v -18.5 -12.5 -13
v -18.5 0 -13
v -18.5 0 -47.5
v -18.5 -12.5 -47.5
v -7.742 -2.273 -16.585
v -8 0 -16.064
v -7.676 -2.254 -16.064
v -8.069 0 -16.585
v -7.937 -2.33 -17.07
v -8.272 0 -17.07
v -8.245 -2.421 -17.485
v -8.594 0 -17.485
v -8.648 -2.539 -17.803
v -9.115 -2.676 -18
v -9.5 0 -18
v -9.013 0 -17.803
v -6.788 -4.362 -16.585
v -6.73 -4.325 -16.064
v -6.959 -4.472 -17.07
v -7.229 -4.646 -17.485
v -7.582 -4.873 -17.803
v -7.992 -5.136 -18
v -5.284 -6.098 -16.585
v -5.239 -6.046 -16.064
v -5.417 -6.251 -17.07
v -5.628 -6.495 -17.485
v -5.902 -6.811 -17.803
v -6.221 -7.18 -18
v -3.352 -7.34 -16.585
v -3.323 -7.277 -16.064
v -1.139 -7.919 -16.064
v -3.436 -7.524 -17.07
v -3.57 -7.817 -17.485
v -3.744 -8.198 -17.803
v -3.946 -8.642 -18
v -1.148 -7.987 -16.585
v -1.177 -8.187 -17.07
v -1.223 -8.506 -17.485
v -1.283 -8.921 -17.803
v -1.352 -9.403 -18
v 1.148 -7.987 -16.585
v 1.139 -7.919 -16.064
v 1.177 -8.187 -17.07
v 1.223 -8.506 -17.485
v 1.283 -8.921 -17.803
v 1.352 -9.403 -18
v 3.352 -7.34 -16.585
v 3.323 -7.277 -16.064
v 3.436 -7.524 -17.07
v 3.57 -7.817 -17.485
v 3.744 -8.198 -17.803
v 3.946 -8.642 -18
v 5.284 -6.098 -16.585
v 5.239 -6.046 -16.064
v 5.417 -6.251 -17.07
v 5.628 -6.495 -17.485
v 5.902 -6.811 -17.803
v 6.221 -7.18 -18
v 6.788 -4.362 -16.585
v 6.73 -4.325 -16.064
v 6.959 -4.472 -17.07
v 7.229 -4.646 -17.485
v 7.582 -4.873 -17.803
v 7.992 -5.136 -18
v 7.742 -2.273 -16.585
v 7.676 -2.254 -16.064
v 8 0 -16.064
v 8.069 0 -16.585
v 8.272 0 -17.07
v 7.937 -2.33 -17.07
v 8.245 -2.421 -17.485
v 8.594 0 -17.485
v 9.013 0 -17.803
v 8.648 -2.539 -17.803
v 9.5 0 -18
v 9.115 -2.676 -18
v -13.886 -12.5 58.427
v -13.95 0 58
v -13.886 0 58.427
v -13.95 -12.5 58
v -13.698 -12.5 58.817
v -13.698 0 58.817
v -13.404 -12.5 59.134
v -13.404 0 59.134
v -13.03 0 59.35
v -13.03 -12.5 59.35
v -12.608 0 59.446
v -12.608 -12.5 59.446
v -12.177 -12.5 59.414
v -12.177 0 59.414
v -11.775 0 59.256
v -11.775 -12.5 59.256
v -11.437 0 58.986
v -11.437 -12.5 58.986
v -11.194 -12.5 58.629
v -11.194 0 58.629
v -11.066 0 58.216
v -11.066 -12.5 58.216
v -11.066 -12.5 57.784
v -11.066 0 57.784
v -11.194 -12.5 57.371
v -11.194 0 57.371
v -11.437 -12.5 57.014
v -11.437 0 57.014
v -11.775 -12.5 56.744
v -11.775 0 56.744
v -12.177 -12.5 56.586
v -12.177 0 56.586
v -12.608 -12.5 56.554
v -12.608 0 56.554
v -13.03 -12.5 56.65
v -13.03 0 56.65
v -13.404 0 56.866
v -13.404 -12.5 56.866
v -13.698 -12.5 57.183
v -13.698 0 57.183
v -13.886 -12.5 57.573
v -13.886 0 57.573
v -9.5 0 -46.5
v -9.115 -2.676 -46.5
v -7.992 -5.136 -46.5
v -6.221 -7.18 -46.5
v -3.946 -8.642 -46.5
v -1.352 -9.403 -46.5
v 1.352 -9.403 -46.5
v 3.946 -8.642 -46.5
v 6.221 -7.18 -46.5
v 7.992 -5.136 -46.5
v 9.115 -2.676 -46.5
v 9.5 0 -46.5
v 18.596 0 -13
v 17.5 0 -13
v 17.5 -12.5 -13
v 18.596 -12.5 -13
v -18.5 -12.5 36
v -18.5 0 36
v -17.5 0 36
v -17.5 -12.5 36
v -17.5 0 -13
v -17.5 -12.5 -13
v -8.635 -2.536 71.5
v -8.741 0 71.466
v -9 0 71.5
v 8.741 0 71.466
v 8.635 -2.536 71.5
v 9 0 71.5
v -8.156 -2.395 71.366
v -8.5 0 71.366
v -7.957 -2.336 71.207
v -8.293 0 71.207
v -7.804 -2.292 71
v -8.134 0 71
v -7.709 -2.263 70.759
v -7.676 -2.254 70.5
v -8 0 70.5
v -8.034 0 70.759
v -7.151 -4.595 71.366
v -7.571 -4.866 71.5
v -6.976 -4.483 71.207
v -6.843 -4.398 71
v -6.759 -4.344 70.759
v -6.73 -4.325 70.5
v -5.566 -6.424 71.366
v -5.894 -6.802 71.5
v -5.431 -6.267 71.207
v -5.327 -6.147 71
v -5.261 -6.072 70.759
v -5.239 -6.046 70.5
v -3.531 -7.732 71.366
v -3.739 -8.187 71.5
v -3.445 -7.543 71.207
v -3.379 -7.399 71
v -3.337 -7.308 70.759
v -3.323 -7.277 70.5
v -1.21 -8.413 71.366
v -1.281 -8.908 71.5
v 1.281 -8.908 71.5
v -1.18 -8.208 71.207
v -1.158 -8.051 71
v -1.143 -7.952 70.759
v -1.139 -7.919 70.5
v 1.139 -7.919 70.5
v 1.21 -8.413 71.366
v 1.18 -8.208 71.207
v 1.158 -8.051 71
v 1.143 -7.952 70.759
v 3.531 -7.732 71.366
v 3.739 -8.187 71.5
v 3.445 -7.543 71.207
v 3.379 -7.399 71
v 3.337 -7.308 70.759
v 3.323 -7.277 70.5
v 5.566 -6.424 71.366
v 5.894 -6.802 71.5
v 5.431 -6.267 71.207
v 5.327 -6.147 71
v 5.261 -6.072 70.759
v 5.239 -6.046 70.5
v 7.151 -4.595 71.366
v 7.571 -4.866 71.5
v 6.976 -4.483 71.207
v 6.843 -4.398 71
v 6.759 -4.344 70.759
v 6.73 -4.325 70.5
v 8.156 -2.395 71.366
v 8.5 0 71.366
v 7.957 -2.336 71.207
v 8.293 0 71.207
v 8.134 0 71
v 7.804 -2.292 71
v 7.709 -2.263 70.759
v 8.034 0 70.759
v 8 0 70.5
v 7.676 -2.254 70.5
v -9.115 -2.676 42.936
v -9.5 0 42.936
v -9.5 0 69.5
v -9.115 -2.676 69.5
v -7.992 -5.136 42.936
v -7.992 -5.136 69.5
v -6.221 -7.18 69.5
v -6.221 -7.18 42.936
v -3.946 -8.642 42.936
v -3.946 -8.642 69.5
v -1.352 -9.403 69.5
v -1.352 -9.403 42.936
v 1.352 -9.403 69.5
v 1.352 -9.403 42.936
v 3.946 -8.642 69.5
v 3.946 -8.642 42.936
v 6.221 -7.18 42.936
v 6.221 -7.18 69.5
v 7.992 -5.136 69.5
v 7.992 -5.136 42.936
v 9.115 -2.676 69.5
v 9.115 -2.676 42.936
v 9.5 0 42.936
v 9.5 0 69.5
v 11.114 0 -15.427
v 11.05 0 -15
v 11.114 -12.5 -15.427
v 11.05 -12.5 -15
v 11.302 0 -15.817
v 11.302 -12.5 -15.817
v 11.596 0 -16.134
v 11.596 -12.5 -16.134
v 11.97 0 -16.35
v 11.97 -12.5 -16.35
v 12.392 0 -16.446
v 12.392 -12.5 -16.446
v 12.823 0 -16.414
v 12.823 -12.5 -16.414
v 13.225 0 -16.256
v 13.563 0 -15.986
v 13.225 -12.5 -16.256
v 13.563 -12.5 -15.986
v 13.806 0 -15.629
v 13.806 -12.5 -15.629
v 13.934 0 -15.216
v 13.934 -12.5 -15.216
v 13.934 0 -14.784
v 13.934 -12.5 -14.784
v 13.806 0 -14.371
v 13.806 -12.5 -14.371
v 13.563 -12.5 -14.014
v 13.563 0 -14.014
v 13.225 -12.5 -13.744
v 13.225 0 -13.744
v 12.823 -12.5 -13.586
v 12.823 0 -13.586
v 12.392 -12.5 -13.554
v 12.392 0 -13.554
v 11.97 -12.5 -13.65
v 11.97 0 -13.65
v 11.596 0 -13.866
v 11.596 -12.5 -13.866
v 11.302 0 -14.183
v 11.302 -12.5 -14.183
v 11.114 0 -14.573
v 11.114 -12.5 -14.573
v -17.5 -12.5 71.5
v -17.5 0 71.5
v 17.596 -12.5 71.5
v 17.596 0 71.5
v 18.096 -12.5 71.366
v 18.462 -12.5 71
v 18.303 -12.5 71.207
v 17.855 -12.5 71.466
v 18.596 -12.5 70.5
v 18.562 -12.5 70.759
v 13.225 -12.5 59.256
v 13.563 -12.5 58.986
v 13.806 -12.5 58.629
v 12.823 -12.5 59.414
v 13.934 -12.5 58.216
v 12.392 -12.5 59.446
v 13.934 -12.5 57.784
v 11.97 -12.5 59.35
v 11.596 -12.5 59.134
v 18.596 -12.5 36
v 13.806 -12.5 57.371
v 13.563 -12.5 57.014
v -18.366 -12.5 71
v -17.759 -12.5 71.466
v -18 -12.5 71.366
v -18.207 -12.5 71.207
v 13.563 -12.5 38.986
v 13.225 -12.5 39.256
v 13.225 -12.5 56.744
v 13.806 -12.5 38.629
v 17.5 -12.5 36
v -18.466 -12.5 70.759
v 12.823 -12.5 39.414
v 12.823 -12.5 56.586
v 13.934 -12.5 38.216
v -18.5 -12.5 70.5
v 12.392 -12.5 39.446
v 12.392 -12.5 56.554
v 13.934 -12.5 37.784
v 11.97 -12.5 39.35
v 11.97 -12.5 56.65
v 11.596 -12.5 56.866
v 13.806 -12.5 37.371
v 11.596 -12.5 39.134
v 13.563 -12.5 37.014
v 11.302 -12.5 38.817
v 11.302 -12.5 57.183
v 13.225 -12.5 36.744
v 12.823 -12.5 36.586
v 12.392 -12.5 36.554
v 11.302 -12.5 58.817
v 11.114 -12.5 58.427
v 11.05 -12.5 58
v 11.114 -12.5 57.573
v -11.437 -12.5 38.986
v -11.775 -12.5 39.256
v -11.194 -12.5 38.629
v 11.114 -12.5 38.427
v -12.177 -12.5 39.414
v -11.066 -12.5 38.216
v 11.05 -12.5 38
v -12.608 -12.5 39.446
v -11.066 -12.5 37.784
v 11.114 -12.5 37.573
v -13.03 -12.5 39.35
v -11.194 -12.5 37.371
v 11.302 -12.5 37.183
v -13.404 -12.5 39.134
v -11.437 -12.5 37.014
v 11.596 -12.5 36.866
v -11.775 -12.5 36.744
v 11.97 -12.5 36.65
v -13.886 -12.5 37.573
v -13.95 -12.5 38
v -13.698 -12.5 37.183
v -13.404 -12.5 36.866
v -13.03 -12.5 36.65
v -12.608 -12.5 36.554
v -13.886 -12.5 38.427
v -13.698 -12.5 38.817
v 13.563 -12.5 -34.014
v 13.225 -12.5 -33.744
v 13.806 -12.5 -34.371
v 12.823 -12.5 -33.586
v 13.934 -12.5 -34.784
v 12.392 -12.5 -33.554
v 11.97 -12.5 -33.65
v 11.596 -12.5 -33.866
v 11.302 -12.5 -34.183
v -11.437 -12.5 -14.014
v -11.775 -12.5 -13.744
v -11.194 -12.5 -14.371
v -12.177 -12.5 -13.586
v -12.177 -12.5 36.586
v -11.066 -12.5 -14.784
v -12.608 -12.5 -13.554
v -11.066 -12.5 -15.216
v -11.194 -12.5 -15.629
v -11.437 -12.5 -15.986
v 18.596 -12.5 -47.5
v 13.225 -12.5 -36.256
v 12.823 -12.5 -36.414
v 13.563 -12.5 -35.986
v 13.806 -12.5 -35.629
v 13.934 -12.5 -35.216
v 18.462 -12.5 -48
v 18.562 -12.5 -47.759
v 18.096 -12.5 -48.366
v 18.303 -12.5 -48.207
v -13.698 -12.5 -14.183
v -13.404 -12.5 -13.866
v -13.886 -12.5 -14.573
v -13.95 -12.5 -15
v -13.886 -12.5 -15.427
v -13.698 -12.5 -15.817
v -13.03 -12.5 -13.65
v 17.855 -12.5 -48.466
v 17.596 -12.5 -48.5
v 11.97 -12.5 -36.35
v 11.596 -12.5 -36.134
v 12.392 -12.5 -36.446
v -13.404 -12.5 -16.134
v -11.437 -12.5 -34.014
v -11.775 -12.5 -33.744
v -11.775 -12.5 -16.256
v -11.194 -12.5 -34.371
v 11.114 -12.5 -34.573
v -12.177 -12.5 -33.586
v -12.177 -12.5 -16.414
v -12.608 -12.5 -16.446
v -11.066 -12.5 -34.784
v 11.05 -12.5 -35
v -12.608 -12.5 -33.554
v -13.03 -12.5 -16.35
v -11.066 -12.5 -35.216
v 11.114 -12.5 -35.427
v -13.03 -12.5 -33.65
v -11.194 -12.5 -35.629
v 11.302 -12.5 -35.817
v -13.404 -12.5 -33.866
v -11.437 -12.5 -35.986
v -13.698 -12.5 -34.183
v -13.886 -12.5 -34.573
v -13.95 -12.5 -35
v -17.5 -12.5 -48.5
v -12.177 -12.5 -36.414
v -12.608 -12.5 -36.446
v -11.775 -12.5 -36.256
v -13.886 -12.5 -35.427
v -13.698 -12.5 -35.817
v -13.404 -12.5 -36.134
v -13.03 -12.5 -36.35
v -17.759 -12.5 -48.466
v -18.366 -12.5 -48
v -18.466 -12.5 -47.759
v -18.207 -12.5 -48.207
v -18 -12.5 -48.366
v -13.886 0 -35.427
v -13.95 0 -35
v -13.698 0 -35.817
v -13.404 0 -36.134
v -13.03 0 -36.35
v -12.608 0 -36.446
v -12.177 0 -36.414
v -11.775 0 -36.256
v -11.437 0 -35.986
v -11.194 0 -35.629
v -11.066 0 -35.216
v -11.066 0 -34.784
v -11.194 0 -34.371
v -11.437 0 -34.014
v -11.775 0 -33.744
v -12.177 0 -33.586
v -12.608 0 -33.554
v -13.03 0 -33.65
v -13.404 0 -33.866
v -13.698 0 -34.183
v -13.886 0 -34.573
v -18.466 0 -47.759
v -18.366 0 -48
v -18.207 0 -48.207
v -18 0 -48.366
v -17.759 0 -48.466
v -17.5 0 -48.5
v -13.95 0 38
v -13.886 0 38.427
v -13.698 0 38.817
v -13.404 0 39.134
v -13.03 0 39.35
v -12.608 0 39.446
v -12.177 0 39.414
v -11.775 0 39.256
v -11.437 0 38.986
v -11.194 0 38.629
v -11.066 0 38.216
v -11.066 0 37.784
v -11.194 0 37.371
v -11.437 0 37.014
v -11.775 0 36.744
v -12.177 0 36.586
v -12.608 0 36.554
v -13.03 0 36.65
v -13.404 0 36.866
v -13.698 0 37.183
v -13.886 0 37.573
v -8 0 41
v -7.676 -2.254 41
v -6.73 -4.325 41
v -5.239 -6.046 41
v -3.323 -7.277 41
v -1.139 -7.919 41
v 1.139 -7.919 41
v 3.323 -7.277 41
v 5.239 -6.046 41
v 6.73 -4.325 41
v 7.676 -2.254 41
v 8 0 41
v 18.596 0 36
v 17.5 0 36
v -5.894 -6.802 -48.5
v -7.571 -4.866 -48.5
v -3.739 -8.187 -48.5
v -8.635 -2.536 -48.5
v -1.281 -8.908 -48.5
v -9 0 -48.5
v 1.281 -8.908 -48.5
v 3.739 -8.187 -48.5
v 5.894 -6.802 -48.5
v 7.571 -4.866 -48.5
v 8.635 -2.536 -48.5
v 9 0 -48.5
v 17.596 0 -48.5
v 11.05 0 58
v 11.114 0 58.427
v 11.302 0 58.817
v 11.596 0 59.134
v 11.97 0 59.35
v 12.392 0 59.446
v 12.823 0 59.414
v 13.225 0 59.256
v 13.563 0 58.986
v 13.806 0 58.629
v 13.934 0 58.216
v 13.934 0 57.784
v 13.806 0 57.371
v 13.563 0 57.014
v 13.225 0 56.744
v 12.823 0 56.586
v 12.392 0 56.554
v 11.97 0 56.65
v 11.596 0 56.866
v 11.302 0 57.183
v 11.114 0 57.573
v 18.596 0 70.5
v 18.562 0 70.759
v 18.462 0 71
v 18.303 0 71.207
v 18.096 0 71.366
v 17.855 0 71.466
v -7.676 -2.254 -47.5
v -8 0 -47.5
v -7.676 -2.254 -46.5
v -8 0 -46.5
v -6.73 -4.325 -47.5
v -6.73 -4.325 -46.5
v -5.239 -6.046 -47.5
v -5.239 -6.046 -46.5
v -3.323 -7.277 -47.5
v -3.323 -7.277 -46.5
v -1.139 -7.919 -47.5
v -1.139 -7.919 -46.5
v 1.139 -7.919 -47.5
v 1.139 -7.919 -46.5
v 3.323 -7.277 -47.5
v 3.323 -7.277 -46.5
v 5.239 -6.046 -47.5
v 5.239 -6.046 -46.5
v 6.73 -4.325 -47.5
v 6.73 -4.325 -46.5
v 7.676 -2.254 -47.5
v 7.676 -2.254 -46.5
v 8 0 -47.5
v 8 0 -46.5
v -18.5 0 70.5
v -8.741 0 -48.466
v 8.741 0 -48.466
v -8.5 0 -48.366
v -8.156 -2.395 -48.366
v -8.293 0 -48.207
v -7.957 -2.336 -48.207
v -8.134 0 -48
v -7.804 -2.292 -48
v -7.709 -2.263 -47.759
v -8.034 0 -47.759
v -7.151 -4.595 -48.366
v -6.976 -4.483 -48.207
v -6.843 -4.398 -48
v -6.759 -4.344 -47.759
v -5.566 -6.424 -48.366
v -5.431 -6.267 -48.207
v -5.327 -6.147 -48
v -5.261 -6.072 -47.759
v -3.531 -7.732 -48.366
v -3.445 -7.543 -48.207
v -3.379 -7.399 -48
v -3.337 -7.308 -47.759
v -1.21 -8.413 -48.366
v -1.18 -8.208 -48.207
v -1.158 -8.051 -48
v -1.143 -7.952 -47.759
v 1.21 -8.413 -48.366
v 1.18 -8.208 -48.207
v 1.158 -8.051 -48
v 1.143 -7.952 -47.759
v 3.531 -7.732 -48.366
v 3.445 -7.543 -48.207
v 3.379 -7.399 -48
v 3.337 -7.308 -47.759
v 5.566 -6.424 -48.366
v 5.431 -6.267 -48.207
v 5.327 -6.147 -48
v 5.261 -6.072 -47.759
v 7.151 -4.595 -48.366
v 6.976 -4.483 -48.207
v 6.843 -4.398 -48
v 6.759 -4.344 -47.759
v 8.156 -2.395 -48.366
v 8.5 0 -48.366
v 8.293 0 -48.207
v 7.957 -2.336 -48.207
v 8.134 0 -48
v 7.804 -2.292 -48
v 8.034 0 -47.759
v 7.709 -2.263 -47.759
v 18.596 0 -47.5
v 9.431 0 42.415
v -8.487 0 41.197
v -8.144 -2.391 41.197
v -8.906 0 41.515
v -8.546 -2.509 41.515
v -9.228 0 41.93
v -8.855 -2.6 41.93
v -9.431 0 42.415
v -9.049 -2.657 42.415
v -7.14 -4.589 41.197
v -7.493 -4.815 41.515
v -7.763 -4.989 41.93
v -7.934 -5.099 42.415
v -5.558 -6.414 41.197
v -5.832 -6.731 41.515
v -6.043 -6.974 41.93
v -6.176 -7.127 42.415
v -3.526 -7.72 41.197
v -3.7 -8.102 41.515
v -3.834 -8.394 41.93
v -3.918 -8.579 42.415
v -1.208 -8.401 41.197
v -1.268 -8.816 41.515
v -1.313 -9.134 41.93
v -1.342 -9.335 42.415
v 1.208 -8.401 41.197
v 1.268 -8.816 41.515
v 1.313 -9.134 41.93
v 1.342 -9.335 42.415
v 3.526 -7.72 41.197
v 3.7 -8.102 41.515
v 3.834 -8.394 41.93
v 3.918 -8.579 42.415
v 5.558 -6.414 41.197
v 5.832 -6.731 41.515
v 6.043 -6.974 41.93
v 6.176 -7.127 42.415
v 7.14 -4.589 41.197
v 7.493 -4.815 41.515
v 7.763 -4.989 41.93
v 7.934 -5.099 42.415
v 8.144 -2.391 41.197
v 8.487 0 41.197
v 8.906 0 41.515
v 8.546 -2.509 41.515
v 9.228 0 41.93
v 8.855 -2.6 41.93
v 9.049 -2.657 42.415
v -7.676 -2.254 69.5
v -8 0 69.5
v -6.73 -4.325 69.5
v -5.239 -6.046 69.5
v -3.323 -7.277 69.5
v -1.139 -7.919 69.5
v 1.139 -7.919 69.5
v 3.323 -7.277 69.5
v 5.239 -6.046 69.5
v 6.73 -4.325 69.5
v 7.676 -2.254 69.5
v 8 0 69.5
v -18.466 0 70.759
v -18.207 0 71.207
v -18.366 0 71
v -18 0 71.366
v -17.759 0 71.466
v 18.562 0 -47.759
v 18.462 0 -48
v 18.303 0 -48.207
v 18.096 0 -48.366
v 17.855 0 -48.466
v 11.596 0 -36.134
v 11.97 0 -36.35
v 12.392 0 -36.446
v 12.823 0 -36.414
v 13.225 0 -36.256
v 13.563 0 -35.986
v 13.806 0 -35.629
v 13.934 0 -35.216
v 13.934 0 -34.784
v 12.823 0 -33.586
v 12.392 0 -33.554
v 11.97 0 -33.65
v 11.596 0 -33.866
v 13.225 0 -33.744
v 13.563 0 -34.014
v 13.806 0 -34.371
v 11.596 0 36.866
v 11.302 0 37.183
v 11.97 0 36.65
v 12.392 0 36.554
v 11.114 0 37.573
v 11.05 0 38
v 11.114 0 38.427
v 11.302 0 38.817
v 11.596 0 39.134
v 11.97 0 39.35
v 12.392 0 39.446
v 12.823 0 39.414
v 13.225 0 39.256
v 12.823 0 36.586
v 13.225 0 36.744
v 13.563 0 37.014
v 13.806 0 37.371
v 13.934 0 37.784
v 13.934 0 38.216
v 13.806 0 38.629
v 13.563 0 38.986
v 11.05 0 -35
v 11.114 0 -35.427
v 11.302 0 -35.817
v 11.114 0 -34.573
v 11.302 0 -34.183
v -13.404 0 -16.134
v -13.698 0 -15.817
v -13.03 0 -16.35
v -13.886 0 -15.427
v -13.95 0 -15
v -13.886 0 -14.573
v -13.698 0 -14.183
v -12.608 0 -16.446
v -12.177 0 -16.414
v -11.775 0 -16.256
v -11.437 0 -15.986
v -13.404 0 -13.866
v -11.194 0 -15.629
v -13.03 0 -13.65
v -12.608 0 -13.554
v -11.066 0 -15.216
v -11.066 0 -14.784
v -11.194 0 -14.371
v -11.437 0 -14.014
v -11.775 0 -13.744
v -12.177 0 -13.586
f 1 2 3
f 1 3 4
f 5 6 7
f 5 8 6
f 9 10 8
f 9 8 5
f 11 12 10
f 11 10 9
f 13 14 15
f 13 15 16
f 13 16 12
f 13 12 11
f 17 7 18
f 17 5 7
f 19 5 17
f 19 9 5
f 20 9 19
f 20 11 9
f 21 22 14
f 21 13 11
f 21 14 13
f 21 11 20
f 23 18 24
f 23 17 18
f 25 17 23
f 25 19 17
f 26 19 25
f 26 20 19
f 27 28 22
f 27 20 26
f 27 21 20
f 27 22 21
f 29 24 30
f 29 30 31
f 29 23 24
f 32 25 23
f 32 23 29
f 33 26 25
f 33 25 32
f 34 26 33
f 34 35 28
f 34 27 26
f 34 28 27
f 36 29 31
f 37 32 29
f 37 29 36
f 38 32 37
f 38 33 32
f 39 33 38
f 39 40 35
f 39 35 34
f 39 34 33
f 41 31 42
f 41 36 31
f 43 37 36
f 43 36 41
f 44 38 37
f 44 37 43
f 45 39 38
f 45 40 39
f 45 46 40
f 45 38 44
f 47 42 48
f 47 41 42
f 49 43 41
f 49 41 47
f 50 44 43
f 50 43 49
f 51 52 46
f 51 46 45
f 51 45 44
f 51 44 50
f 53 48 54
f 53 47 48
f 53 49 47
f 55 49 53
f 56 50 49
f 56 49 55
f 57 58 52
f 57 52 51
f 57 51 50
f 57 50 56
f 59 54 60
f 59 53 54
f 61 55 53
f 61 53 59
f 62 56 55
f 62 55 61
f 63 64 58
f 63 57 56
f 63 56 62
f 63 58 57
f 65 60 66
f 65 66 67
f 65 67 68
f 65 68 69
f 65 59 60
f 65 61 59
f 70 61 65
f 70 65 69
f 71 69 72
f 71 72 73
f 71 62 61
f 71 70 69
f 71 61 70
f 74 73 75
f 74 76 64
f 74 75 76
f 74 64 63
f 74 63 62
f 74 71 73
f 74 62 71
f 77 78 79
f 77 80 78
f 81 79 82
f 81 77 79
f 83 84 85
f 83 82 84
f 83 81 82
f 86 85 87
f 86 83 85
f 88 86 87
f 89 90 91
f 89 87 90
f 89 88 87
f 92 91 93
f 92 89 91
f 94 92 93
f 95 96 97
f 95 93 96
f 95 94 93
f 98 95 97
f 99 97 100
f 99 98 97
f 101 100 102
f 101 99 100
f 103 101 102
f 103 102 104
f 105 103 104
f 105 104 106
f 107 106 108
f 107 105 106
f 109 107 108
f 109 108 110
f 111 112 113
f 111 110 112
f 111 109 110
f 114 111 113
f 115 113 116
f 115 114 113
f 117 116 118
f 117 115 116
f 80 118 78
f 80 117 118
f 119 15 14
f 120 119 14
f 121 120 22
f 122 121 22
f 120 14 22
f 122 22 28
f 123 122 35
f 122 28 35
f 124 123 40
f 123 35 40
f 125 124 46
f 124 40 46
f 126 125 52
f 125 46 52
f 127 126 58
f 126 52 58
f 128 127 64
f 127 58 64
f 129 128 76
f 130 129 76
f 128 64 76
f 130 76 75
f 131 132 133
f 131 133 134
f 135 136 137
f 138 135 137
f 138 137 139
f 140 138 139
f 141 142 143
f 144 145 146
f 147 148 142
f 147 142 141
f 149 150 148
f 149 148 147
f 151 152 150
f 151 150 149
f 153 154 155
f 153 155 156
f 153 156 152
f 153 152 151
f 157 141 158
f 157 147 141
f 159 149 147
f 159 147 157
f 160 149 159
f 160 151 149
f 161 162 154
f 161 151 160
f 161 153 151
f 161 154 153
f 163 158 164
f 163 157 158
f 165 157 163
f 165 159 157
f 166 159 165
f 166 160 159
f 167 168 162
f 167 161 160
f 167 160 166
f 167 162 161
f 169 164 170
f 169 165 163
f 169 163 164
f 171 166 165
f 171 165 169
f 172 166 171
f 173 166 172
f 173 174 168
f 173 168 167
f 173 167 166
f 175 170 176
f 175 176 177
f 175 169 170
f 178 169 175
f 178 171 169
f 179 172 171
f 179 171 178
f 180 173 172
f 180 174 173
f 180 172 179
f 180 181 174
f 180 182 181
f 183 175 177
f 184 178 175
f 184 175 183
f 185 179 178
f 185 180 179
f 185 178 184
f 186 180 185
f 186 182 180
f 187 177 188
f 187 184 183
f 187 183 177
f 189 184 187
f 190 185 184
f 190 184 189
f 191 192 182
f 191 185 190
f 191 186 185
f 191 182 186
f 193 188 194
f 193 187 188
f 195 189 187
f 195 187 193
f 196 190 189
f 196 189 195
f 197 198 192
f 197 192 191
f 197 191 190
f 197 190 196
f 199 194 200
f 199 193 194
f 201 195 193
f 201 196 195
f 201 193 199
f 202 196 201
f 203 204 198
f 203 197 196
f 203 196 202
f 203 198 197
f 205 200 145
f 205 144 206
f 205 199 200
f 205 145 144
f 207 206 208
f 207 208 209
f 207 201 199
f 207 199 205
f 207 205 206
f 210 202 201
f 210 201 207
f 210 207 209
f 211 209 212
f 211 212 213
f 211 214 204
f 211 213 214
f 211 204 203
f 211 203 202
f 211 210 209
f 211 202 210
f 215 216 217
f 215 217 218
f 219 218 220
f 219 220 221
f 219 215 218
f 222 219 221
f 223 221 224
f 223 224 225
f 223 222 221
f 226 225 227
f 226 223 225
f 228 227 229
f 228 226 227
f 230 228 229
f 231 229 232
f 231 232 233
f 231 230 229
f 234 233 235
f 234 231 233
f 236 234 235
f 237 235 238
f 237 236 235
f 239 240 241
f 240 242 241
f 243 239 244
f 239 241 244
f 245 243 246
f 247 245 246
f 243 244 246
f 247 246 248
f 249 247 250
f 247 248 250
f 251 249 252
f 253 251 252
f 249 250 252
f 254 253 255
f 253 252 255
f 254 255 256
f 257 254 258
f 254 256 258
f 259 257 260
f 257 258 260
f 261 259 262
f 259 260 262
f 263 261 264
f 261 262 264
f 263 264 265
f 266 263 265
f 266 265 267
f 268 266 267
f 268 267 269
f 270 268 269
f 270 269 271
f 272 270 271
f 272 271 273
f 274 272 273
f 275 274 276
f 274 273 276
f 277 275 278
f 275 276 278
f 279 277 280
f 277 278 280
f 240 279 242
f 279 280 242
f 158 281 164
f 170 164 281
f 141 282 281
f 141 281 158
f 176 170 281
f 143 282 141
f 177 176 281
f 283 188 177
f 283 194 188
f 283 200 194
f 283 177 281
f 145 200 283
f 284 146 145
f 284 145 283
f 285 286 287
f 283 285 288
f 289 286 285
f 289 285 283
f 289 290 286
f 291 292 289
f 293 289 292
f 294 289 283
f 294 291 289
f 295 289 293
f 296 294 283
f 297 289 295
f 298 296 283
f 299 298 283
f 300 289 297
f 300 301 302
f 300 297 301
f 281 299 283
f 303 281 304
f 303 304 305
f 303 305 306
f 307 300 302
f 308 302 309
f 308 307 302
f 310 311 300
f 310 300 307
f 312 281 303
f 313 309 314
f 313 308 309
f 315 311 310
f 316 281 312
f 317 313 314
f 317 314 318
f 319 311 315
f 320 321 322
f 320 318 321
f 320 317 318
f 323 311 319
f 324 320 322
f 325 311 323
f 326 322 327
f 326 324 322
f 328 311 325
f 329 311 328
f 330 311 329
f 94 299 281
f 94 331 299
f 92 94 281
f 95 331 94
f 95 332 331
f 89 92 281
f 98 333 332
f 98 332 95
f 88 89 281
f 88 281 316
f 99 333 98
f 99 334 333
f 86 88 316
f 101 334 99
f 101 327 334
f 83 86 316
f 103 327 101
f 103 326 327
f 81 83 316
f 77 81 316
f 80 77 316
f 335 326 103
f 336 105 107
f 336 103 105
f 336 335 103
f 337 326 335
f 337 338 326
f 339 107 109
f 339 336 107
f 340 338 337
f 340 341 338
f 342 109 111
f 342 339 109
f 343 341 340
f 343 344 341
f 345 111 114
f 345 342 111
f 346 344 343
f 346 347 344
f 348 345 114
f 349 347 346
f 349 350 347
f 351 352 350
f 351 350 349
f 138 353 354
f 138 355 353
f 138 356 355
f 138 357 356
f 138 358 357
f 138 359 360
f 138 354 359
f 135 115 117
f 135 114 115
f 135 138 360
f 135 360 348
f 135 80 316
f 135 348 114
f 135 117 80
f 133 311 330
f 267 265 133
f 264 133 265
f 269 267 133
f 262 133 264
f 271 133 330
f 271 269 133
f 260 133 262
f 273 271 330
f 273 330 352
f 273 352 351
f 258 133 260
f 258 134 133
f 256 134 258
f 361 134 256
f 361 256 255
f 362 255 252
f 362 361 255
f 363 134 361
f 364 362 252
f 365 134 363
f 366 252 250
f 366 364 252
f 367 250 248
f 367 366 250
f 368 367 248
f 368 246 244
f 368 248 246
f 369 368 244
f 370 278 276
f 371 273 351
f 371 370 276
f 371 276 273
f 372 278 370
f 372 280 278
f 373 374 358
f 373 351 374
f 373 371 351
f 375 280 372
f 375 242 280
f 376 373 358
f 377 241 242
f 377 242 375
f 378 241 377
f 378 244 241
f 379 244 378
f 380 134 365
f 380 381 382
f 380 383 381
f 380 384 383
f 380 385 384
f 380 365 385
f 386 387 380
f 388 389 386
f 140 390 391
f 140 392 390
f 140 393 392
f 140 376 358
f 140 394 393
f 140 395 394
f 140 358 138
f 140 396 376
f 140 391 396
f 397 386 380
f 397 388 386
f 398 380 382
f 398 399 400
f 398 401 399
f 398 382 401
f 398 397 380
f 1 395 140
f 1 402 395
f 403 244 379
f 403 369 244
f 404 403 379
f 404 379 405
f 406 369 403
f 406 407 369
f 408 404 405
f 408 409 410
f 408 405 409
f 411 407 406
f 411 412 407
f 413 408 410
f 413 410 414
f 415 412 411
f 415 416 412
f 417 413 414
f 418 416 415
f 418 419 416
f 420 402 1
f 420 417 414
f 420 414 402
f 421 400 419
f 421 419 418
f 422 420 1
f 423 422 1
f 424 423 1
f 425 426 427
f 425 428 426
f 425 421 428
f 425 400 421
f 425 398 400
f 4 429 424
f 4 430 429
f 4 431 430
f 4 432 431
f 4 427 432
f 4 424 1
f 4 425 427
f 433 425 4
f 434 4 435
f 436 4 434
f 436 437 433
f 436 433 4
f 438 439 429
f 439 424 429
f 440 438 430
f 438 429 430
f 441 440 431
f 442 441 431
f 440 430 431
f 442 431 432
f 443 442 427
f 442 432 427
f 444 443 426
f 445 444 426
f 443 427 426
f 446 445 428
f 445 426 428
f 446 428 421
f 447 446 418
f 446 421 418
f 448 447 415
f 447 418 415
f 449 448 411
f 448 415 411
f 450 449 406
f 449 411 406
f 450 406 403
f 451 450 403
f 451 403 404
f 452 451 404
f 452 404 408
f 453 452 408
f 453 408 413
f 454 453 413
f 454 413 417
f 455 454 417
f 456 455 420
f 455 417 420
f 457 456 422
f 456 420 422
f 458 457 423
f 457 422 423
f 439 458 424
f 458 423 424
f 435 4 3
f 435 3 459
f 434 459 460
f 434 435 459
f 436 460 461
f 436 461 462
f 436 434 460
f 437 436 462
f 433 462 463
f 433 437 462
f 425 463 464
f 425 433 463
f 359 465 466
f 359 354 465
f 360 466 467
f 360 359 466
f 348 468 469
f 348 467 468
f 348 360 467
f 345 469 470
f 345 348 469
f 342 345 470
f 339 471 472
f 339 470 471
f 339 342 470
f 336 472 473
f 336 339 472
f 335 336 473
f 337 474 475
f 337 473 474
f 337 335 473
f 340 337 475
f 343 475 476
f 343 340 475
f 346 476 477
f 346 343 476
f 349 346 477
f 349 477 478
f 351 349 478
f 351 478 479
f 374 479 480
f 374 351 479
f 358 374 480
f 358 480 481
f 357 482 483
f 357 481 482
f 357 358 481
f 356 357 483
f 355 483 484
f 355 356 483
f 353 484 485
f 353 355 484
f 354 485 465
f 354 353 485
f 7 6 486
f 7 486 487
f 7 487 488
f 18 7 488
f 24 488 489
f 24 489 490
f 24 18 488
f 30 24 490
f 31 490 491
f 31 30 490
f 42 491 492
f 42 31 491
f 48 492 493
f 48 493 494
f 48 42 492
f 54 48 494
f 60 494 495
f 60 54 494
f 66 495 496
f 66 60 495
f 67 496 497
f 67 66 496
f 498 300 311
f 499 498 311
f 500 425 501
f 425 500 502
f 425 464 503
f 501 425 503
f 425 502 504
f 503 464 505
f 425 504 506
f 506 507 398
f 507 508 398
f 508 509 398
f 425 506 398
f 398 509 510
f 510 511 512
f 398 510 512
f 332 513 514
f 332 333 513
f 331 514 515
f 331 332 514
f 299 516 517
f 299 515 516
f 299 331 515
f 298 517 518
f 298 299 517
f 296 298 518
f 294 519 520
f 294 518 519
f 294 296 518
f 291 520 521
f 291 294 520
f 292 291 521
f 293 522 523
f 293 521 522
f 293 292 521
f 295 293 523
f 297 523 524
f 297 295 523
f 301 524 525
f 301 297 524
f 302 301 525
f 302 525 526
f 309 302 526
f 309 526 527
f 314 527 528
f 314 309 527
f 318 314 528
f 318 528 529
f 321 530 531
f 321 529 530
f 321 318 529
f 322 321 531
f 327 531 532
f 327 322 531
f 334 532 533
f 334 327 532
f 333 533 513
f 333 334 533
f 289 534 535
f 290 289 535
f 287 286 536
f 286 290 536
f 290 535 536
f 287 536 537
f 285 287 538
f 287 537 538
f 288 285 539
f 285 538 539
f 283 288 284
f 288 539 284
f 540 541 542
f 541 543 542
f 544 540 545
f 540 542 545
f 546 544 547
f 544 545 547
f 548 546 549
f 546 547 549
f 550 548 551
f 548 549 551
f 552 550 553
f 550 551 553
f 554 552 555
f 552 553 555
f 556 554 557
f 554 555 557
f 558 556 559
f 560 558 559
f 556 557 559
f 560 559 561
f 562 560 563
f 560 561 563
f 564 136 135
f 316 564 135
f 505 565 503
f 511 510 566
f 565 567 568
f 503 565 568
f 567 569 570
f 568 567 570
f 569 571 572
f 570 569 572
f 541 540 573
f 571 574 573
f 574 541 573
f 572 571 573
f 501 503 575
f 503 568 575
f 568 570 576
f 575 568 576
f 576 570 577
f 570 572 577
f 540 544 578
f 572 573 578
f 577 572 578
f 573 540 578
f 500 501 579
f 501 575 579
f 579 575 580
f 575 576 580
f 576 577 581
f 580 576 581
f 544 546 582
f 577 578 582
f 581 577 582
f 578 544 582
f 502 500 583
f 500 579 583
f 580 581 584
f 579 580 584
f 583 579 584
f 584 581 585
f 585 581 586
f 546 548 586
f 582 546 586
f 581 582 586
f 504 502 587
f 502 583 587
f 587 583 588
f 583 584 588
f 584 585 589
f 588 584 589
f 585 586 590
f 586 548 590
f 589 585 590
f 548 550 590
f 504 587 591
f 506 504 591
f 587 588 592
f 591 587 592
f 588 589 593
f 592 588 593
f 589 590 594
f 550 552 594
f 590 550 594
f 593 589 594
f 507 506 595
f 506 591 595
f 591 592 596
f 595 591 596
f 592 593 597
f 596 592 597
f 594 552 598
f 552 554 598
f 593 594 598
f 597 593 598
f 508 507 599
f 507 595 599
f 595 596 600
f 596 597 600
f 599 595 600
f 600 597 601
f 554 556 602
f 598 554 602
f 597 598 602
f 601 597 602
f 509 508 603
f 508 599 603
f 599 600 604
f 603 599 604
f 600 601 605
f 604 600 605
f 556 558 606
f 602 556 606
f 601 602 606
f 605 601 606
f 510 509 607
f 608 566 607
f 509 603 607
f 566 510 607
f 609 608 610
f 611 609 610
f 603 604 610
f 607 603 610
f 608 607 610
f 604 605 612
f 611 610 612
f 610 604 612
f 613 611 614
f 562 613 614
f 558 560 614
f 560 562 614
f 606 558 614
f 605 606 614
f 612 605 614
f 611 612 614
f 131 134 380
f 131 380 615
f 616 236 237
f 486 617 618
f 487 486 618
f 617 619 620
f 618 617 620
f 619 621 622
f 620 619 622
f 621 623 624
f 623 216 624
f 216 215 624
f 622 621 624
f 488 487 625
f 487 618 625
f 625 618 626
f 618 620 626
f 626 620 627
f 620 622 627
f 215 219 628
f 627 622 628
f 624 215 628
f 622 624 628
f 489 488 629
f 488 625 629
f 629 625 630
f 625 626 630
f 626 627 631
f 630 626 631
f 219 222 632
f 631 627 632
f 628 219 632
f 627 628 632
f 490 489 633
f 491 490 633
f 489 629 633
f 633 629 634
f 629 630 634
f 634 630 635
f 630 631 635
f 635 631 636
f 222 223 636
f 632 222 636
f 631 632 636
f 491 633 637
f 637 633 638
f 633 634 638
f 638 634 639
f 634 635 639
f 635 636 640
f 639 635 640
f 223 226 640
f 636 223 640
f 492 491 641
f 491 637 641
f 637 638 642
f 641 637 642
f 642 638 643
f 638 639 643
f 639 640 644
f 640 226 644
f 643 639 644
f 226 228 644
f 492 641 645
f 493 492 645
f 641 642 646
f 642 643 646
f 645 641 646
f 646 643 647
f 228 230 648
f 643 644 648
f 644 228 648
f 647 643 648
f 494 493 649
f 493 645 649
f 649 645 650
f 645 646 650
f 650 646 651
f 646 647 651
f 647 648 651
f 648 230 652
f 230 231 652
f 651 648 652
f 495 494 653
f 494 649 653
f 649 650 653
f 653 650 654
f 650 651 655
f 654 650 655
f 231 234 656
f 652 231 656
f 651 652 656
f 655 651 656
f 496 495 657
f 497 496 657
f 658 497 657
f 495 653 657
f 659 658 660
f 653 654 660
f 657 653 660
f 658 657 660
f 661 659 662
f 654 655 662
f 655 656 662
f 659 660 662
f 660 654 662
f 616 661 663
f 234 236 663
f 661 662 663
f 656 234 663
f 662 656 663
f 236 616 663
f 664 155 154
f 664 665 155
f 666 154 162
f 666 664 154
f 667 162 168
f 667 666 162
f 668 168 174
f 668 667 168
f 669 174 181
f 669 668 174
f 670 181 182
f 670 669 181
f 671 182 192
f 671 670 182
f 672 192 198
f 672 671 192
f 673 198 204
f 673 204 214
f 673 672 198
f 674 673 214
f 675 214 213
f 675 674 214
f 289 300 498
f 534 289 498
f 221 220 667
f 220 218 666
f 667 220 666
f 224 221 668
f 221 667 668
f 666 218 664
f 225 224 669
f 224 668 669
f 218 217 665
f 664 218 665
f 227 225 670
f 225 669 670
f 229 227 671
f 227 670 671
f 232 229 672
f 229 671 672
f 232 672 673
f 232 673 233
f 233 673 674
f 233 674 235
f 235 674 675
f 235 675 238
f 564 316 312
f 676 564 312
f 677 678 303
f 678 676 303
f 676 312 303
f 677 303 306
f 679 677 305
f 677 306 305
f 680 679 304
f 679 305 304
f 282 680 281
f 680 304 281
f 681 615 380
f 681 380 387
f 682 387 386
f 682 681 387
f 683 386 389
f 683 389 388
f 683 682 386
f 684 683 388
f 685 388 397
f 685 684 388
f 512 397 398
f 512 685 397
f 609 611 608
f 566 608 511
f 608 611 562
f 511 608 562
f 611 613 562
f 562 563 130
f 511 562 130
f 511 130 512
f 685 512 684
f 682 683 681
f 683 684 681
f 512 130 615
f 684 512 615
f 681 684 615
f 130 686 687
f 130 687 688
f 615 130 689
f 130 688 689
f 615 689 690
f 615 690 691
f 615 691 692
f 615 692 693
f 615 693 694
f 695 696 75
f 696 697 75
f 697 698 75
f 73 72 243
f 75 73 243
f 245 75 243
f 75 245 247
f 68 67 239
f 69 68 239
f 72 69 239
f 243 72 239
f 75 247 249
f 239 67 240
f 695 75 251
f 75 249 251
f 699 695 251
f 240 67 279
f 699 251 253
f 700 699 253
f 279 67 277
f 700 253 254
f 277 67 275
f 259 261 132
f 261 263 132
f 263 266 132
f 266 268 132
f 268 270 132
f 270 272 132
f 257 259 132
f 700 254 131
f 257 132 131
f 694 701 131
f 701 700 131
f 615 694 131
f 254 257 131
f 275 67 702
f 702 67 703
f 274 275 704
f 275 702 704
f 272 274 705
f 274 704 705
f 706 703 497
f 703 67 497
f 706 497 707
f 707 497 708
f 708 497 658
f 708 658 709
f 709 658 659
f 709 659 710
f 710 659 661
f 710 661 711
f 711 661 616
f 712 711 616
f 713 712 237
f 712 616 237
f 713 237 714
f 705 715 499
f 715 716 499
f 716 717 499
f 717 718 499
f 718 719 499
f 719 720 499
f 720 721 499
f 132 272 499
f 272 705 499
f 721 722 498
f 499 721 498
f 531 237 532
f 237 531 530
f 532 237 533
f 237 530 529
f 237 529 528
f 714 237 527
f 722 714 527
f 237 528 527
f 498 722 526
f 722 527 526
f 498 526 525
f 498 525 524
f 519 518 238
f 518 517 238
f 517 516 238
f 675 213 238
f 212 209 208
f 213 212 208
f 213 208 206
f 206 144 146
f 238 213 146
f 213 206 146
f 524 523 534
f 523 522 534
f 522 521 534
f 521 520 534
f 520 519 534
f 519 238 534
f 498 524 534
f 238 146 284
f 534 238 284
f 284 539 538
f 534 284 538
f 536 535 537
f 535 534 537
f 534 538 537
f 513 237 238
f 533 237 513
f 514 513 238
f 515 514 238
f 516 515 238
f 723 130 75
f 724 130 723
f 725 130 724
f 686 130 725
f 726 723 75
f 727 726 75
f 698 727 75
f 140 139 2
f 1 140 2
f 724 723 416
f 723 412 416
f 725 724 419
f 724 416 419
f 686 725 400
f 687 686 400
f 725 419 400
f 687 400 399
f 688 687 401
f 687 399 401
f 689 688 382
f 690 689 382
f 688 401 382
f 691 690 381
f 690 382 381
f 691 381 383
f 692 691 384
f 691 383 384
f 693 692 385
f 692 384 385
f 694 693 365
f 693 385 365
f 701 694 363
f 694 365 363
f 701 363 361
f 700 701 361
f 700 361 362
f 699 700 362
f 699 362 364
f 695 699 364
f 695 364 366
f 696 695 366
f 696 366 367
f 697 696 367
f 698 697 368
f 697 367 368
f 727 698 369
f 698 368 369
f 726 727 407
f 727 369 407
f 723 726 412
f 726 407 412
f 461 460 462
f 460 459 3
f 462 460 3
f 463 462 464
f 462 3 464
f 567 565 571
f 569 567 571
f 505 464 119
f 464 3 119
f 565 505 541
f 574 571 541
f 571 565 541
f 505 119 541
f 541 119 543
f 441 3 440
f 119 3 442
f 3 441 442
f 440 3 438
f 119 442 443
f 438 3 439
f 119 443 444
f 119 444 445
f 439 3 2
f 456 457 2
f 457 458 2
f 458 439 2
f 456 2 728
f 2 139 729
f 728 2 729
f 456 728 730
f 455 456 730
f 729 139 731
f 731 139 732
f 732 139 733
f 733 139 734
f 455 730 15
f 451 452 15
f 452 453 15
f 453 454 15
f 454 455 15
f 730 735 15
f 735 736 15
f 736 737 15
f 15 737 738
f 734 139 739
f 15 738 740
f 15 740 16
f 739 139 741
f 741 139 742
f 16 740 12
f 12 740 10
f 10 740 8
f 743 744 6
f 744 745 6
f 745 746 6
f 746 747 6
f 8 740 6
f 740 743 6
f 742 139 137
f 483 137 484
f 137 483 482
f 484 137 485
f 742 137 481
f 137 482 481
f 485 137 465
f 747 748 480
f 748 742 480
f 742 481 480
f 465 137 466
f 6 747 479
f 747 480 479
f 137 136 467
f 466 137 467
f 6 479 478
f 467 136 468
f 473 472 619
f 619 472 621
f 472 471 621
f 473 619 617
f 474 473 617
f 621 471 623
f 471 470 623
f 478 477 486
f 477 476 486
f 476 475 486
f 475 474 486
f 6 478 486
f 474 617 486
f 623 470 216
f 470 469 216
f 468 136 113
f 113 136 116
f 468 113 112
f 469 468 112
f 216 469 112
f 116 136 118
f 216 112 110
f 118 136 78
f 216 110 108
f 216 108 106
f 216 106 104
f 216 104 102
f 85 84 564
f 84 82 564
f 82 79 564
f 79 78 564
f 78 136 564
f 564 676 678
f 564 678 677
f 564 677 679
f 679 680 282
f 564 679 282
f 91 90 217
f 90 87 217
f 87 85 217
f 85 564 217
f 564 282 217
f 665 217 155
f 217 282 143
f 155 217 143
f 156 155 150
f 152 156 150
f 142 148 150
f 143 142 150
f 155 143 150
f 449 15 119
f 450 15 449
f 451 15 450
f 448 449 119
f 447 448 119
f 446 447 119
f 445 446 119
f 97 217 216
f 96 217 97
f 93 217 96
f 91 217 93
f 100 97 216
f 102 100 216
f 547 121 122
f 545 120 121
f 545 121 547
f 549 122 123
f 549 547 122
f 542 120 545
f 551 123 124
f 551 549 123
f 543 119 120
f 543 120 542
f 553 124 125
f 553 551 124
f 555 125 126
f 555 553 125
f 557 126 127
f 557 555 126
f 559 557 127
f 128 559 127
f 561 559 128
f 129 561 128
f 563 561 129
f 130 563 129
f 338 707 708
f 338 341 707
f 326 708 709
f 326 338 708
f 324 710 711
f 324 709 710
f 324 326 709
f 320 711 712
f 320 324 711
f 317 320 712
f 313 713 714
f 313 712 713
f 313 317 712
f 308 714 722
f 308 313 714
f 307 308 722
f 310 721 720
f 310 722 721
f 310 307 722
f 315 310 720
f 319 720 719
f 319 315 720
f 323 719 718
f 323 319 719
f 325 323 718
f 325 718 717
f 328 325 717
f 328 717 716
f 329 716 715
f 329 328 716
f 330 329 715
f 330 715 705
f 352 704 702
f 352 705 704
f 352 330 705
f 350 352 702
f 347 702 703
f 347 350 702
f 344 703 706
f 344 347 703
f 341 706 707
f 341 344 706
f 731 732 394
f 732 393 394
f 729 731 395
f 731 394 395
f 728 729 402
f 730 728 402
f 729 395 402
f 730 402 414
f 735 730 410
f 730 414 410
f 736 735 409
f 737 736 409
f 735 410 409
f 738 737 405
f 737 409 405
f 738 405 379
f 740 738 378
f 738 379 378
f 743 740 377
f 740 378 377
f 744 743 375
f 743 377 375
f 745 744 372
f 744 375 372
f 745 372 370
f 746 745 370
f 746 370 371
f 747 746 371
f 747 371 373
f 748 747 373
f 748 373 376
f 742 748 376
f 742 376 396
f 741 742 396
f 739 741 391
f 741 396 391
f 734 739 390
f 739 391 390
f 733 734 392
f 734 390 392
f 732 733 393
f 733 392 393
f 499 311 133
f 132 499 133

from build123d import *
from build123d.topology import SkipClean

# Parameters (mm, degrees)
BOSS_EXTRUDE1_DEPTH      = 41
BOSS_EXTRUDE1_DEPTH_BACK = 18
SKETCH2_R                = 8.000000000000004
SKETCH3_R                = 9.5
BOSS_EXTRUDE2_DEPTH      = 28.5
BOSS_EXTRUDE3_DEPTH      = 5
BOSS_EXTRUDE4_DEPTH      = 25.451834
M3_5_TAPPED_HOLE1_D      = 2.9
FILLET2_R                = 2
SKETCH14_R               = 8.000000000000004
BOSS_EXTRUDE5_DEPTH      = 2
FILLET10_R               = 1
FILLET10_OF_MIRROR2_R    = 1
FILLET11_R               = 1
FILLET12_R               = 2
SKETCH15_W               = 47.04564696040835
SKETCH15_H               = 19.155839546122916
CUT_EXTRUDE2_DEPTH       = 123.75548779255048
SKETCH16_W               = 50.32184914639417
SKETCH16_H               = 9.010919354068848
CUT_EXTRUDE3_DEPTH       = 123.68683594132897


# Some blends are built 0.0001 mm under size
with BuildPart() as part:
    # Sketch2 → Boss-Extrude1 (new, two sides: drawn at the far end of the back side and taken through both)
    with BuildSketch(Plane.XY.offset(-BOSS_EXTRUDE1_DEPTH_BACK)):
        with BuildLine():
            Line((-12.5, -12.500000000000002), (12.5, -12.500000000000002))
            Line((12.5, -12.500000000000002), (12.5, 5.999999999999994))
            Line((12.5, 5.999999999999994), (12.5, 12.951833846988604))
            ThreePointArc((12.5, 12.951833846988604), (9.463639319119588, 15.311418315675832), (5.995365002334926, 16.97220075561143))
            Line((5.995365002334926, 16.97220075561143), (-1.0000000000000027, 16.97220075561143))
            Line((-1.0000000000000027, 16.97220075561143), (-5.995365002334937, 16.972200755611425))
            ThreePointArc((-5.995365002334937, 16.972200755611425), (-9.463639319119597, 15.311418315675827), (-12.5, 12.951833846988608))
            Line((-12.5, 12.951833846988608), (-12.5, 6.000000000000001))
            Line((-12.5, 6.000000000000001), (-12.5, -12.500000000000002))
        make_face()
        Circle(SKETCH2_R, mode=Mode.SUBTRACT)
    extrude(amount=BOSS_EXTRUDE1_DEPTH + BOSS_EXTRUDE1_DEPTH_BACK)

    # Sketch3 → Boss-Extrude2 (add)
    with BuildSketch(Plane.XY.offset(41)):
        with BuildLine():
            Line((-1.0000000000000016, 17.97498435543818), (0.727272727272726, 17.97498435543818))
            Line((0.727272727272726, 17.97498435543818), (8.769260939312526, 17.974984355438174))
            ThreePointArc((8.769260939312526, 17.974984355438174), (11.304195151298408, 16.498944571740374), (13.595959595959597, 14.667988364633844))
            Line((13.595959595959597, 14.667988364633844), (13.595959595959597, 6.224872228225638))
            Line((13.595959595959597, 6.224872228225638), (13.595959595959597, -12.5))
            Line((13.595959595959597, -12.5), (-13.500000000000002, -12.500000000000004))
            Line((-13.500000000000002, -12.500000000000004), (-13.500000000000002, 6.223411383455548))
            Line((-13.500000000000002, 6.223411383455548), (-13.500000000000002, 14.756354563373698))
            ThreePointArc((-13.500000000000002, 14.756354563373698), (-11.250328445445001, 16.535722236104803), (-8.769260939312526, 17.97498435543818))
            Line((-8.769260939312526, 17.97498435543818), (-1.0000000000000016, 17.97498435543818))
        make_face()
        with Locations(Location((-1.73e-15, 0, 0), (0, 0, 180))):
            Circle(SKETCH3_R, mode=Mode.SUBTRACT)
    boss_extrude2 = extrude(amount=BOSS_EXTRUDE2_DEPTH)

    # Mirror1: Boss-Extrude2 across plane
    add(boss_extrude2.mirror(Plane.XY.offset(11.5)))

    # Sketch4 → Boss-Extrude3 (add)
    with BuildSketch(Plane.XZ.offset(12.500000000000002)):
        Polygon((-13.500000000000002, 41), (-13.500000000000002, 69.5), (-18.500000000000004, 69.5), (-18.500000000000004, 42.75), (-18.500000000000004, 36.00000000000001), (-17.5, 36.00000000000001), (-17.5, -13), (-18.500000000000004, -13.000000000000002), (-18.500000000000004, -46.5), (-13.500000000000002, -46.5), (-13.500000000000002, -18.000000000000004), (-12.499999999999998, -18.000000000000004), (-12.5, 41), align=None)
        Polygon((18.595959595959595, 69.5), (13.595959595959597, 69.5), (13.595959595959597, 41), (12.5, 41), (12.5, -18.000000000000004), (13.595959595959597, -18.000000000000004), (13.595959595959597, -46.5), (18.5959595959596, -46.5), (18.595959595959595, -13), (17.5, -13.000000000000002), (17.5, 36.00000000000001), (18.595959595959595, 36.00000000000001), (18.595959595959595, 42.75), align=None)
        Polygon((13.595959595959597, -18.000000000000004), (12.5, -18.000000000000004), (12.5, 41), (13.595959595959597, 41), (13.595959595959597, 69.5), (-13.500000000000002, 69.5), (-13.500000000000002, 41), (-12.5, 41), (-12.499999999999998, -18.000000000000004), (-13.500000000000002, -18.000000000000004), (-13.500000000000002, -46.5), (13.595959595959597, -46.5), align=None)
    extrude(amount=BOSS_EXTRUDE3_DEPTH)

    # Sketch5 → Boss-Extrude4 (add)
    with BuildSketch(Plane(origin=(0, -12.500000000000002, 0), x_dir=(1, 0, 0), z_dir=(0, 1, 0))):
        Polygon((13.595959595959597, -41), (13.595959595959597, -69.5), (18.595959595959595, -69.5), (18.595959595959595, -36.00000000000001), (17.5, -36.00000000000001), (17.5, 13.000000000000002), (18.595959595959595, 13.000000000000002), (18.595959595959595, 46.5), (13.595959595959597, 46.5), (13.595959595959597, 18.000000000000004), (12.5, 18.000000000000004), (12.5, -41), align=None)
        Polygon((-18.500000000000004, -69.5), (-13.500000000000002, -69.5), (-13.500000000000002, -41), (-12.5, -41), (-12.499999999999998, 18.000000000000004), (-13.500000000000002, 18.000000000000004), (-13.500000000000002, 46.5), (-18.5, 46.5), (-18.500000000000004, 13.000000000000002), (-17.5, 13.000000000000002), (-17.5, -36.00000000000001), (-18.500000000000004, -36.00000000000001), align=None)
    extrude(amount=BOSS_EXTRUDE4_DEPTH)

    # M3.5 Tapped Hole1 (through all)
    with Locations(Plane(origin=(-1.179e-14, 16.97220075561143, 0), x_dir=(1, 6.9e-16, 0), z_dir=(-6.9e-16, 1, 0))):
        with Locations((-12.5, 15), (12.5, 15), (12.5, 35), (-12.5, 35)):
            m3_5_tapped_hole1 = Hole(M3_5_TAPPED_HOLE1_D / 2)

    # Fillet2
    fillet2_edges = [part.edges().sort_by_distance(p)[0] for p in [
        (18.595959595959595, 12.951834, -29.75),
        (-18.5, 12.951834, -29.75),
    ]]
    fillet(fillet2_edges, radius=FILLET2_R - 0.0001)  # a hair under: the kernel refuses the full size

    # Sketch14 → Boss-Extrude5 (add)
    with SkipClean():  # the faces are left unmerged after this step: merging them gives an invalid solid
        with BuildSketch(Plane.XY.offset(69.5)):
            with BuildLine():
                Line((13.595959595959597, 12.951833846988603), (-13.500000000000002, 12.951833846988603))
                Line((-13.500000000000002, 12.951833846988603), (-16.5, 12.951833846988603))
                ThreePointArc((-16.5, 12.951833846988604), (-17.914213562373096, 12.366047409361698), (-18.5, 10.951833846988603))
                Line((-18.500000000000004, 10.951833846988603), (-18.500000000000004, -17.5))
                Line((-18.500000000000004, -17.5), (18.595959595959595, -17.5))
                Line((18.595959595959595, -17.5), (18.595959595959595, 10.951833846988603))
                ThreePointArc((18.595959595959595, 10.951833846988603), (18.01017315833269, 12.366047409361698), (16.595959595959595, 12.951833846988603))
                Line((16.595959595959595, 12.951833846988604), (13.595959595959597, 12.951833846988603))
            make_face()
            Circle(SKETCH14_R, mode=Mode.SUBTRACT)
        boss_extrude5 = extrude(amount=BOSS_EXTRUDE5_DEPTH)

    # Fillet10
    fillet10_edges = [part.edges().sort_by_distance(p)[0] for p in [
        (0.04797979797979934, 12.951833846988603, 71.5),
        (-8.000000000000004, 9.8e-16, 71.5),
        (-17.914213562373096, 12.366047409361698, 71.5),
        (-18.500000000000004, -3.2740830765056987, 71.5),
        (0.04797979797979579, -17.5, 71.5),
        (18.595959595959595, -3.2740830765056987, 71.5),
        (18.01017315833269, 12.366047409361698, 71.5),
    ]]
    fillet(fillet10_edges, radius=FILLET10_R)

    # Mirror2: Boss-Extrude5 across plane
    with SkipClean():  # the faces are left unmerged after this step: merging them gives an invalid solid
        add(boss_extrude5.mirror(Plane.XY.offset(11.5)))

    # Fillet10 of Mirror2
    fillet10_of_mirror2_edges = [part.edges().sort_by_distance(p)[0] for p in [
        (0.04797979797979934, 12.951833846988603, -48.5),
        (-8.000000000000004, 9.8e-16, -48.5),
        (-17.914213562373096, 12.366047409361698, -48.5),
        (-18.500000000000004, -3.2740830765056987, -48.5),
        (0.04797979797979579, -17.5, -48.5),
        (18.595959595959595, -3.2740830765056987, -48.5),
        (18.01017315833269, 12.366047409361698, -48.5),
    ]]
    fillet(fillet10_of_mirror2_edges, radius=FILLET10_OF_MIRROR2_R)

    # Fillet11
    fillet11_edges = [part.edges().sort_by_distance(p)[0] for p in [
        (11.304195151298412, 16.498944571740378, 69.5),
        (1.78e-15, 17.974984355438178, 69.5),
        (-11.250328445445, 16.535722236104803, 69.5),
        (-11.250328445445, 16.535722236104803, -46.5),
        (1.78e-15, 17.974984355438178, -46.5),
        (11.304195151298412, 16.498944571740378, -46.5),
    ]]
    fillet(fillet11_edges, radius=FILLET11_R)

    # Fillet12
    # the kernel refuses this fillet: 2 mm, written as the material it adds along each edge
    with BuildSketch(Plane(origin=(-1.73e-15, 0, 41), x_dir=(-1, 1.2e-16, 0), z_dir=(1.2e-16, 1, 0))) as fillet12_piece_1:
        with BuildLine():
            CenterArc((7.5, 1.9364916731037098), FILLET12_R, 284.47751218593, 75.52248781407002)
            Line((8.000000000000004, 0), (8.010000000000003, -0.03872983346207093))
            ThreePointArc((8.010000000000003, -0.03872983346207093), (8.750000000000002, -0.03999999999999915), (9.5, -0.03999999999999915))
            Line((9.5, -0.03999999999999915), (9.54, 0))
            Line((9.54, 0), (9.54, 1.9364916731037098))
            Line((9.54, 1.9364916731037098), (9.5, 1.9364916731037098))
        make_face()
    revolve(axis=Axis((-1.73e-15, 0, 41), (0, 0, 1)))
    # the kernel refuses this fillet: 2 mm, written as the material it takes off along each edge
    with BuildSketch(Plane(origin=(-1.73e-15, 0, -18), x_dir=(1, 0, 0), z_dir=(0, -1, 0))) as fillet12_2_piece_1:
        with BuildLine():
            CenterArc((10.000000000000004, 1.9364916731037063), FILLET12_R, 180, 75.52248781406996)
            Line((8.000000000000004, 1.9364916731037063), (7.9600000000000035, 1.9364916731037063))
            Line((7.9600000000000035, 1.9364916731037063), (7.9600000000000035, 0))
            Line((7.9600000000000035, 0), (8.000000000000004, -0.03999999999999915))
            ThreePointArc((8.000000000000004, -0.03999999999999915), (8.750000000000002, -0.03999999999999915), (9.49, -0.03872983346207448))
            Line((9.49, -0.03872983346207448), (9.5, 0))
        make_face()
    revolve(axis=Axis((-1.73e-15, 0, -18), (0, 0, 1)), mode=Mode.SUBTRACT)

    # Mirror3: M3.5 Tapped Hole1 across plane
    with SkipClean():  # the faces are left unmerged after this step: merging them gives an invalid solid
        add(m3_5_tapped_hole1.mirror(Plane.XY.offset(11.5)), mode=Mode.SUBTRACT)

    # Sketch15 → Cut-Extrude2 (cut, through all)
    with BuildSketch(Plane.XY.offset(71.50000000000001)):
        with Locations((2.6415149640881275, 9.577919773061458)):
            Rectangle(SKETCH15_W, SKETCH15_H)
    extrude(amount=-CUT_EXTRUDE2_DEPTH, mode=Mode.SUBTRACT)

    # Sketch16 → Cut-Extrude3 (cut, through all)
    with BuildSketch(Plane(origin=(0, 0, -48.50000000000001), x_dir=(-1, 0, 0), z_dir=(0, 0, -1))):
        with Locations((0.38733031574332877, -17.005459677034427)):
            Rectangle(SKETCH16_W, SKETCH16_H)
    extrude(amount=-CUT_EXTRUDE3_DEPTH, mode=Mode.SUBTRACT)


solid = part.part
